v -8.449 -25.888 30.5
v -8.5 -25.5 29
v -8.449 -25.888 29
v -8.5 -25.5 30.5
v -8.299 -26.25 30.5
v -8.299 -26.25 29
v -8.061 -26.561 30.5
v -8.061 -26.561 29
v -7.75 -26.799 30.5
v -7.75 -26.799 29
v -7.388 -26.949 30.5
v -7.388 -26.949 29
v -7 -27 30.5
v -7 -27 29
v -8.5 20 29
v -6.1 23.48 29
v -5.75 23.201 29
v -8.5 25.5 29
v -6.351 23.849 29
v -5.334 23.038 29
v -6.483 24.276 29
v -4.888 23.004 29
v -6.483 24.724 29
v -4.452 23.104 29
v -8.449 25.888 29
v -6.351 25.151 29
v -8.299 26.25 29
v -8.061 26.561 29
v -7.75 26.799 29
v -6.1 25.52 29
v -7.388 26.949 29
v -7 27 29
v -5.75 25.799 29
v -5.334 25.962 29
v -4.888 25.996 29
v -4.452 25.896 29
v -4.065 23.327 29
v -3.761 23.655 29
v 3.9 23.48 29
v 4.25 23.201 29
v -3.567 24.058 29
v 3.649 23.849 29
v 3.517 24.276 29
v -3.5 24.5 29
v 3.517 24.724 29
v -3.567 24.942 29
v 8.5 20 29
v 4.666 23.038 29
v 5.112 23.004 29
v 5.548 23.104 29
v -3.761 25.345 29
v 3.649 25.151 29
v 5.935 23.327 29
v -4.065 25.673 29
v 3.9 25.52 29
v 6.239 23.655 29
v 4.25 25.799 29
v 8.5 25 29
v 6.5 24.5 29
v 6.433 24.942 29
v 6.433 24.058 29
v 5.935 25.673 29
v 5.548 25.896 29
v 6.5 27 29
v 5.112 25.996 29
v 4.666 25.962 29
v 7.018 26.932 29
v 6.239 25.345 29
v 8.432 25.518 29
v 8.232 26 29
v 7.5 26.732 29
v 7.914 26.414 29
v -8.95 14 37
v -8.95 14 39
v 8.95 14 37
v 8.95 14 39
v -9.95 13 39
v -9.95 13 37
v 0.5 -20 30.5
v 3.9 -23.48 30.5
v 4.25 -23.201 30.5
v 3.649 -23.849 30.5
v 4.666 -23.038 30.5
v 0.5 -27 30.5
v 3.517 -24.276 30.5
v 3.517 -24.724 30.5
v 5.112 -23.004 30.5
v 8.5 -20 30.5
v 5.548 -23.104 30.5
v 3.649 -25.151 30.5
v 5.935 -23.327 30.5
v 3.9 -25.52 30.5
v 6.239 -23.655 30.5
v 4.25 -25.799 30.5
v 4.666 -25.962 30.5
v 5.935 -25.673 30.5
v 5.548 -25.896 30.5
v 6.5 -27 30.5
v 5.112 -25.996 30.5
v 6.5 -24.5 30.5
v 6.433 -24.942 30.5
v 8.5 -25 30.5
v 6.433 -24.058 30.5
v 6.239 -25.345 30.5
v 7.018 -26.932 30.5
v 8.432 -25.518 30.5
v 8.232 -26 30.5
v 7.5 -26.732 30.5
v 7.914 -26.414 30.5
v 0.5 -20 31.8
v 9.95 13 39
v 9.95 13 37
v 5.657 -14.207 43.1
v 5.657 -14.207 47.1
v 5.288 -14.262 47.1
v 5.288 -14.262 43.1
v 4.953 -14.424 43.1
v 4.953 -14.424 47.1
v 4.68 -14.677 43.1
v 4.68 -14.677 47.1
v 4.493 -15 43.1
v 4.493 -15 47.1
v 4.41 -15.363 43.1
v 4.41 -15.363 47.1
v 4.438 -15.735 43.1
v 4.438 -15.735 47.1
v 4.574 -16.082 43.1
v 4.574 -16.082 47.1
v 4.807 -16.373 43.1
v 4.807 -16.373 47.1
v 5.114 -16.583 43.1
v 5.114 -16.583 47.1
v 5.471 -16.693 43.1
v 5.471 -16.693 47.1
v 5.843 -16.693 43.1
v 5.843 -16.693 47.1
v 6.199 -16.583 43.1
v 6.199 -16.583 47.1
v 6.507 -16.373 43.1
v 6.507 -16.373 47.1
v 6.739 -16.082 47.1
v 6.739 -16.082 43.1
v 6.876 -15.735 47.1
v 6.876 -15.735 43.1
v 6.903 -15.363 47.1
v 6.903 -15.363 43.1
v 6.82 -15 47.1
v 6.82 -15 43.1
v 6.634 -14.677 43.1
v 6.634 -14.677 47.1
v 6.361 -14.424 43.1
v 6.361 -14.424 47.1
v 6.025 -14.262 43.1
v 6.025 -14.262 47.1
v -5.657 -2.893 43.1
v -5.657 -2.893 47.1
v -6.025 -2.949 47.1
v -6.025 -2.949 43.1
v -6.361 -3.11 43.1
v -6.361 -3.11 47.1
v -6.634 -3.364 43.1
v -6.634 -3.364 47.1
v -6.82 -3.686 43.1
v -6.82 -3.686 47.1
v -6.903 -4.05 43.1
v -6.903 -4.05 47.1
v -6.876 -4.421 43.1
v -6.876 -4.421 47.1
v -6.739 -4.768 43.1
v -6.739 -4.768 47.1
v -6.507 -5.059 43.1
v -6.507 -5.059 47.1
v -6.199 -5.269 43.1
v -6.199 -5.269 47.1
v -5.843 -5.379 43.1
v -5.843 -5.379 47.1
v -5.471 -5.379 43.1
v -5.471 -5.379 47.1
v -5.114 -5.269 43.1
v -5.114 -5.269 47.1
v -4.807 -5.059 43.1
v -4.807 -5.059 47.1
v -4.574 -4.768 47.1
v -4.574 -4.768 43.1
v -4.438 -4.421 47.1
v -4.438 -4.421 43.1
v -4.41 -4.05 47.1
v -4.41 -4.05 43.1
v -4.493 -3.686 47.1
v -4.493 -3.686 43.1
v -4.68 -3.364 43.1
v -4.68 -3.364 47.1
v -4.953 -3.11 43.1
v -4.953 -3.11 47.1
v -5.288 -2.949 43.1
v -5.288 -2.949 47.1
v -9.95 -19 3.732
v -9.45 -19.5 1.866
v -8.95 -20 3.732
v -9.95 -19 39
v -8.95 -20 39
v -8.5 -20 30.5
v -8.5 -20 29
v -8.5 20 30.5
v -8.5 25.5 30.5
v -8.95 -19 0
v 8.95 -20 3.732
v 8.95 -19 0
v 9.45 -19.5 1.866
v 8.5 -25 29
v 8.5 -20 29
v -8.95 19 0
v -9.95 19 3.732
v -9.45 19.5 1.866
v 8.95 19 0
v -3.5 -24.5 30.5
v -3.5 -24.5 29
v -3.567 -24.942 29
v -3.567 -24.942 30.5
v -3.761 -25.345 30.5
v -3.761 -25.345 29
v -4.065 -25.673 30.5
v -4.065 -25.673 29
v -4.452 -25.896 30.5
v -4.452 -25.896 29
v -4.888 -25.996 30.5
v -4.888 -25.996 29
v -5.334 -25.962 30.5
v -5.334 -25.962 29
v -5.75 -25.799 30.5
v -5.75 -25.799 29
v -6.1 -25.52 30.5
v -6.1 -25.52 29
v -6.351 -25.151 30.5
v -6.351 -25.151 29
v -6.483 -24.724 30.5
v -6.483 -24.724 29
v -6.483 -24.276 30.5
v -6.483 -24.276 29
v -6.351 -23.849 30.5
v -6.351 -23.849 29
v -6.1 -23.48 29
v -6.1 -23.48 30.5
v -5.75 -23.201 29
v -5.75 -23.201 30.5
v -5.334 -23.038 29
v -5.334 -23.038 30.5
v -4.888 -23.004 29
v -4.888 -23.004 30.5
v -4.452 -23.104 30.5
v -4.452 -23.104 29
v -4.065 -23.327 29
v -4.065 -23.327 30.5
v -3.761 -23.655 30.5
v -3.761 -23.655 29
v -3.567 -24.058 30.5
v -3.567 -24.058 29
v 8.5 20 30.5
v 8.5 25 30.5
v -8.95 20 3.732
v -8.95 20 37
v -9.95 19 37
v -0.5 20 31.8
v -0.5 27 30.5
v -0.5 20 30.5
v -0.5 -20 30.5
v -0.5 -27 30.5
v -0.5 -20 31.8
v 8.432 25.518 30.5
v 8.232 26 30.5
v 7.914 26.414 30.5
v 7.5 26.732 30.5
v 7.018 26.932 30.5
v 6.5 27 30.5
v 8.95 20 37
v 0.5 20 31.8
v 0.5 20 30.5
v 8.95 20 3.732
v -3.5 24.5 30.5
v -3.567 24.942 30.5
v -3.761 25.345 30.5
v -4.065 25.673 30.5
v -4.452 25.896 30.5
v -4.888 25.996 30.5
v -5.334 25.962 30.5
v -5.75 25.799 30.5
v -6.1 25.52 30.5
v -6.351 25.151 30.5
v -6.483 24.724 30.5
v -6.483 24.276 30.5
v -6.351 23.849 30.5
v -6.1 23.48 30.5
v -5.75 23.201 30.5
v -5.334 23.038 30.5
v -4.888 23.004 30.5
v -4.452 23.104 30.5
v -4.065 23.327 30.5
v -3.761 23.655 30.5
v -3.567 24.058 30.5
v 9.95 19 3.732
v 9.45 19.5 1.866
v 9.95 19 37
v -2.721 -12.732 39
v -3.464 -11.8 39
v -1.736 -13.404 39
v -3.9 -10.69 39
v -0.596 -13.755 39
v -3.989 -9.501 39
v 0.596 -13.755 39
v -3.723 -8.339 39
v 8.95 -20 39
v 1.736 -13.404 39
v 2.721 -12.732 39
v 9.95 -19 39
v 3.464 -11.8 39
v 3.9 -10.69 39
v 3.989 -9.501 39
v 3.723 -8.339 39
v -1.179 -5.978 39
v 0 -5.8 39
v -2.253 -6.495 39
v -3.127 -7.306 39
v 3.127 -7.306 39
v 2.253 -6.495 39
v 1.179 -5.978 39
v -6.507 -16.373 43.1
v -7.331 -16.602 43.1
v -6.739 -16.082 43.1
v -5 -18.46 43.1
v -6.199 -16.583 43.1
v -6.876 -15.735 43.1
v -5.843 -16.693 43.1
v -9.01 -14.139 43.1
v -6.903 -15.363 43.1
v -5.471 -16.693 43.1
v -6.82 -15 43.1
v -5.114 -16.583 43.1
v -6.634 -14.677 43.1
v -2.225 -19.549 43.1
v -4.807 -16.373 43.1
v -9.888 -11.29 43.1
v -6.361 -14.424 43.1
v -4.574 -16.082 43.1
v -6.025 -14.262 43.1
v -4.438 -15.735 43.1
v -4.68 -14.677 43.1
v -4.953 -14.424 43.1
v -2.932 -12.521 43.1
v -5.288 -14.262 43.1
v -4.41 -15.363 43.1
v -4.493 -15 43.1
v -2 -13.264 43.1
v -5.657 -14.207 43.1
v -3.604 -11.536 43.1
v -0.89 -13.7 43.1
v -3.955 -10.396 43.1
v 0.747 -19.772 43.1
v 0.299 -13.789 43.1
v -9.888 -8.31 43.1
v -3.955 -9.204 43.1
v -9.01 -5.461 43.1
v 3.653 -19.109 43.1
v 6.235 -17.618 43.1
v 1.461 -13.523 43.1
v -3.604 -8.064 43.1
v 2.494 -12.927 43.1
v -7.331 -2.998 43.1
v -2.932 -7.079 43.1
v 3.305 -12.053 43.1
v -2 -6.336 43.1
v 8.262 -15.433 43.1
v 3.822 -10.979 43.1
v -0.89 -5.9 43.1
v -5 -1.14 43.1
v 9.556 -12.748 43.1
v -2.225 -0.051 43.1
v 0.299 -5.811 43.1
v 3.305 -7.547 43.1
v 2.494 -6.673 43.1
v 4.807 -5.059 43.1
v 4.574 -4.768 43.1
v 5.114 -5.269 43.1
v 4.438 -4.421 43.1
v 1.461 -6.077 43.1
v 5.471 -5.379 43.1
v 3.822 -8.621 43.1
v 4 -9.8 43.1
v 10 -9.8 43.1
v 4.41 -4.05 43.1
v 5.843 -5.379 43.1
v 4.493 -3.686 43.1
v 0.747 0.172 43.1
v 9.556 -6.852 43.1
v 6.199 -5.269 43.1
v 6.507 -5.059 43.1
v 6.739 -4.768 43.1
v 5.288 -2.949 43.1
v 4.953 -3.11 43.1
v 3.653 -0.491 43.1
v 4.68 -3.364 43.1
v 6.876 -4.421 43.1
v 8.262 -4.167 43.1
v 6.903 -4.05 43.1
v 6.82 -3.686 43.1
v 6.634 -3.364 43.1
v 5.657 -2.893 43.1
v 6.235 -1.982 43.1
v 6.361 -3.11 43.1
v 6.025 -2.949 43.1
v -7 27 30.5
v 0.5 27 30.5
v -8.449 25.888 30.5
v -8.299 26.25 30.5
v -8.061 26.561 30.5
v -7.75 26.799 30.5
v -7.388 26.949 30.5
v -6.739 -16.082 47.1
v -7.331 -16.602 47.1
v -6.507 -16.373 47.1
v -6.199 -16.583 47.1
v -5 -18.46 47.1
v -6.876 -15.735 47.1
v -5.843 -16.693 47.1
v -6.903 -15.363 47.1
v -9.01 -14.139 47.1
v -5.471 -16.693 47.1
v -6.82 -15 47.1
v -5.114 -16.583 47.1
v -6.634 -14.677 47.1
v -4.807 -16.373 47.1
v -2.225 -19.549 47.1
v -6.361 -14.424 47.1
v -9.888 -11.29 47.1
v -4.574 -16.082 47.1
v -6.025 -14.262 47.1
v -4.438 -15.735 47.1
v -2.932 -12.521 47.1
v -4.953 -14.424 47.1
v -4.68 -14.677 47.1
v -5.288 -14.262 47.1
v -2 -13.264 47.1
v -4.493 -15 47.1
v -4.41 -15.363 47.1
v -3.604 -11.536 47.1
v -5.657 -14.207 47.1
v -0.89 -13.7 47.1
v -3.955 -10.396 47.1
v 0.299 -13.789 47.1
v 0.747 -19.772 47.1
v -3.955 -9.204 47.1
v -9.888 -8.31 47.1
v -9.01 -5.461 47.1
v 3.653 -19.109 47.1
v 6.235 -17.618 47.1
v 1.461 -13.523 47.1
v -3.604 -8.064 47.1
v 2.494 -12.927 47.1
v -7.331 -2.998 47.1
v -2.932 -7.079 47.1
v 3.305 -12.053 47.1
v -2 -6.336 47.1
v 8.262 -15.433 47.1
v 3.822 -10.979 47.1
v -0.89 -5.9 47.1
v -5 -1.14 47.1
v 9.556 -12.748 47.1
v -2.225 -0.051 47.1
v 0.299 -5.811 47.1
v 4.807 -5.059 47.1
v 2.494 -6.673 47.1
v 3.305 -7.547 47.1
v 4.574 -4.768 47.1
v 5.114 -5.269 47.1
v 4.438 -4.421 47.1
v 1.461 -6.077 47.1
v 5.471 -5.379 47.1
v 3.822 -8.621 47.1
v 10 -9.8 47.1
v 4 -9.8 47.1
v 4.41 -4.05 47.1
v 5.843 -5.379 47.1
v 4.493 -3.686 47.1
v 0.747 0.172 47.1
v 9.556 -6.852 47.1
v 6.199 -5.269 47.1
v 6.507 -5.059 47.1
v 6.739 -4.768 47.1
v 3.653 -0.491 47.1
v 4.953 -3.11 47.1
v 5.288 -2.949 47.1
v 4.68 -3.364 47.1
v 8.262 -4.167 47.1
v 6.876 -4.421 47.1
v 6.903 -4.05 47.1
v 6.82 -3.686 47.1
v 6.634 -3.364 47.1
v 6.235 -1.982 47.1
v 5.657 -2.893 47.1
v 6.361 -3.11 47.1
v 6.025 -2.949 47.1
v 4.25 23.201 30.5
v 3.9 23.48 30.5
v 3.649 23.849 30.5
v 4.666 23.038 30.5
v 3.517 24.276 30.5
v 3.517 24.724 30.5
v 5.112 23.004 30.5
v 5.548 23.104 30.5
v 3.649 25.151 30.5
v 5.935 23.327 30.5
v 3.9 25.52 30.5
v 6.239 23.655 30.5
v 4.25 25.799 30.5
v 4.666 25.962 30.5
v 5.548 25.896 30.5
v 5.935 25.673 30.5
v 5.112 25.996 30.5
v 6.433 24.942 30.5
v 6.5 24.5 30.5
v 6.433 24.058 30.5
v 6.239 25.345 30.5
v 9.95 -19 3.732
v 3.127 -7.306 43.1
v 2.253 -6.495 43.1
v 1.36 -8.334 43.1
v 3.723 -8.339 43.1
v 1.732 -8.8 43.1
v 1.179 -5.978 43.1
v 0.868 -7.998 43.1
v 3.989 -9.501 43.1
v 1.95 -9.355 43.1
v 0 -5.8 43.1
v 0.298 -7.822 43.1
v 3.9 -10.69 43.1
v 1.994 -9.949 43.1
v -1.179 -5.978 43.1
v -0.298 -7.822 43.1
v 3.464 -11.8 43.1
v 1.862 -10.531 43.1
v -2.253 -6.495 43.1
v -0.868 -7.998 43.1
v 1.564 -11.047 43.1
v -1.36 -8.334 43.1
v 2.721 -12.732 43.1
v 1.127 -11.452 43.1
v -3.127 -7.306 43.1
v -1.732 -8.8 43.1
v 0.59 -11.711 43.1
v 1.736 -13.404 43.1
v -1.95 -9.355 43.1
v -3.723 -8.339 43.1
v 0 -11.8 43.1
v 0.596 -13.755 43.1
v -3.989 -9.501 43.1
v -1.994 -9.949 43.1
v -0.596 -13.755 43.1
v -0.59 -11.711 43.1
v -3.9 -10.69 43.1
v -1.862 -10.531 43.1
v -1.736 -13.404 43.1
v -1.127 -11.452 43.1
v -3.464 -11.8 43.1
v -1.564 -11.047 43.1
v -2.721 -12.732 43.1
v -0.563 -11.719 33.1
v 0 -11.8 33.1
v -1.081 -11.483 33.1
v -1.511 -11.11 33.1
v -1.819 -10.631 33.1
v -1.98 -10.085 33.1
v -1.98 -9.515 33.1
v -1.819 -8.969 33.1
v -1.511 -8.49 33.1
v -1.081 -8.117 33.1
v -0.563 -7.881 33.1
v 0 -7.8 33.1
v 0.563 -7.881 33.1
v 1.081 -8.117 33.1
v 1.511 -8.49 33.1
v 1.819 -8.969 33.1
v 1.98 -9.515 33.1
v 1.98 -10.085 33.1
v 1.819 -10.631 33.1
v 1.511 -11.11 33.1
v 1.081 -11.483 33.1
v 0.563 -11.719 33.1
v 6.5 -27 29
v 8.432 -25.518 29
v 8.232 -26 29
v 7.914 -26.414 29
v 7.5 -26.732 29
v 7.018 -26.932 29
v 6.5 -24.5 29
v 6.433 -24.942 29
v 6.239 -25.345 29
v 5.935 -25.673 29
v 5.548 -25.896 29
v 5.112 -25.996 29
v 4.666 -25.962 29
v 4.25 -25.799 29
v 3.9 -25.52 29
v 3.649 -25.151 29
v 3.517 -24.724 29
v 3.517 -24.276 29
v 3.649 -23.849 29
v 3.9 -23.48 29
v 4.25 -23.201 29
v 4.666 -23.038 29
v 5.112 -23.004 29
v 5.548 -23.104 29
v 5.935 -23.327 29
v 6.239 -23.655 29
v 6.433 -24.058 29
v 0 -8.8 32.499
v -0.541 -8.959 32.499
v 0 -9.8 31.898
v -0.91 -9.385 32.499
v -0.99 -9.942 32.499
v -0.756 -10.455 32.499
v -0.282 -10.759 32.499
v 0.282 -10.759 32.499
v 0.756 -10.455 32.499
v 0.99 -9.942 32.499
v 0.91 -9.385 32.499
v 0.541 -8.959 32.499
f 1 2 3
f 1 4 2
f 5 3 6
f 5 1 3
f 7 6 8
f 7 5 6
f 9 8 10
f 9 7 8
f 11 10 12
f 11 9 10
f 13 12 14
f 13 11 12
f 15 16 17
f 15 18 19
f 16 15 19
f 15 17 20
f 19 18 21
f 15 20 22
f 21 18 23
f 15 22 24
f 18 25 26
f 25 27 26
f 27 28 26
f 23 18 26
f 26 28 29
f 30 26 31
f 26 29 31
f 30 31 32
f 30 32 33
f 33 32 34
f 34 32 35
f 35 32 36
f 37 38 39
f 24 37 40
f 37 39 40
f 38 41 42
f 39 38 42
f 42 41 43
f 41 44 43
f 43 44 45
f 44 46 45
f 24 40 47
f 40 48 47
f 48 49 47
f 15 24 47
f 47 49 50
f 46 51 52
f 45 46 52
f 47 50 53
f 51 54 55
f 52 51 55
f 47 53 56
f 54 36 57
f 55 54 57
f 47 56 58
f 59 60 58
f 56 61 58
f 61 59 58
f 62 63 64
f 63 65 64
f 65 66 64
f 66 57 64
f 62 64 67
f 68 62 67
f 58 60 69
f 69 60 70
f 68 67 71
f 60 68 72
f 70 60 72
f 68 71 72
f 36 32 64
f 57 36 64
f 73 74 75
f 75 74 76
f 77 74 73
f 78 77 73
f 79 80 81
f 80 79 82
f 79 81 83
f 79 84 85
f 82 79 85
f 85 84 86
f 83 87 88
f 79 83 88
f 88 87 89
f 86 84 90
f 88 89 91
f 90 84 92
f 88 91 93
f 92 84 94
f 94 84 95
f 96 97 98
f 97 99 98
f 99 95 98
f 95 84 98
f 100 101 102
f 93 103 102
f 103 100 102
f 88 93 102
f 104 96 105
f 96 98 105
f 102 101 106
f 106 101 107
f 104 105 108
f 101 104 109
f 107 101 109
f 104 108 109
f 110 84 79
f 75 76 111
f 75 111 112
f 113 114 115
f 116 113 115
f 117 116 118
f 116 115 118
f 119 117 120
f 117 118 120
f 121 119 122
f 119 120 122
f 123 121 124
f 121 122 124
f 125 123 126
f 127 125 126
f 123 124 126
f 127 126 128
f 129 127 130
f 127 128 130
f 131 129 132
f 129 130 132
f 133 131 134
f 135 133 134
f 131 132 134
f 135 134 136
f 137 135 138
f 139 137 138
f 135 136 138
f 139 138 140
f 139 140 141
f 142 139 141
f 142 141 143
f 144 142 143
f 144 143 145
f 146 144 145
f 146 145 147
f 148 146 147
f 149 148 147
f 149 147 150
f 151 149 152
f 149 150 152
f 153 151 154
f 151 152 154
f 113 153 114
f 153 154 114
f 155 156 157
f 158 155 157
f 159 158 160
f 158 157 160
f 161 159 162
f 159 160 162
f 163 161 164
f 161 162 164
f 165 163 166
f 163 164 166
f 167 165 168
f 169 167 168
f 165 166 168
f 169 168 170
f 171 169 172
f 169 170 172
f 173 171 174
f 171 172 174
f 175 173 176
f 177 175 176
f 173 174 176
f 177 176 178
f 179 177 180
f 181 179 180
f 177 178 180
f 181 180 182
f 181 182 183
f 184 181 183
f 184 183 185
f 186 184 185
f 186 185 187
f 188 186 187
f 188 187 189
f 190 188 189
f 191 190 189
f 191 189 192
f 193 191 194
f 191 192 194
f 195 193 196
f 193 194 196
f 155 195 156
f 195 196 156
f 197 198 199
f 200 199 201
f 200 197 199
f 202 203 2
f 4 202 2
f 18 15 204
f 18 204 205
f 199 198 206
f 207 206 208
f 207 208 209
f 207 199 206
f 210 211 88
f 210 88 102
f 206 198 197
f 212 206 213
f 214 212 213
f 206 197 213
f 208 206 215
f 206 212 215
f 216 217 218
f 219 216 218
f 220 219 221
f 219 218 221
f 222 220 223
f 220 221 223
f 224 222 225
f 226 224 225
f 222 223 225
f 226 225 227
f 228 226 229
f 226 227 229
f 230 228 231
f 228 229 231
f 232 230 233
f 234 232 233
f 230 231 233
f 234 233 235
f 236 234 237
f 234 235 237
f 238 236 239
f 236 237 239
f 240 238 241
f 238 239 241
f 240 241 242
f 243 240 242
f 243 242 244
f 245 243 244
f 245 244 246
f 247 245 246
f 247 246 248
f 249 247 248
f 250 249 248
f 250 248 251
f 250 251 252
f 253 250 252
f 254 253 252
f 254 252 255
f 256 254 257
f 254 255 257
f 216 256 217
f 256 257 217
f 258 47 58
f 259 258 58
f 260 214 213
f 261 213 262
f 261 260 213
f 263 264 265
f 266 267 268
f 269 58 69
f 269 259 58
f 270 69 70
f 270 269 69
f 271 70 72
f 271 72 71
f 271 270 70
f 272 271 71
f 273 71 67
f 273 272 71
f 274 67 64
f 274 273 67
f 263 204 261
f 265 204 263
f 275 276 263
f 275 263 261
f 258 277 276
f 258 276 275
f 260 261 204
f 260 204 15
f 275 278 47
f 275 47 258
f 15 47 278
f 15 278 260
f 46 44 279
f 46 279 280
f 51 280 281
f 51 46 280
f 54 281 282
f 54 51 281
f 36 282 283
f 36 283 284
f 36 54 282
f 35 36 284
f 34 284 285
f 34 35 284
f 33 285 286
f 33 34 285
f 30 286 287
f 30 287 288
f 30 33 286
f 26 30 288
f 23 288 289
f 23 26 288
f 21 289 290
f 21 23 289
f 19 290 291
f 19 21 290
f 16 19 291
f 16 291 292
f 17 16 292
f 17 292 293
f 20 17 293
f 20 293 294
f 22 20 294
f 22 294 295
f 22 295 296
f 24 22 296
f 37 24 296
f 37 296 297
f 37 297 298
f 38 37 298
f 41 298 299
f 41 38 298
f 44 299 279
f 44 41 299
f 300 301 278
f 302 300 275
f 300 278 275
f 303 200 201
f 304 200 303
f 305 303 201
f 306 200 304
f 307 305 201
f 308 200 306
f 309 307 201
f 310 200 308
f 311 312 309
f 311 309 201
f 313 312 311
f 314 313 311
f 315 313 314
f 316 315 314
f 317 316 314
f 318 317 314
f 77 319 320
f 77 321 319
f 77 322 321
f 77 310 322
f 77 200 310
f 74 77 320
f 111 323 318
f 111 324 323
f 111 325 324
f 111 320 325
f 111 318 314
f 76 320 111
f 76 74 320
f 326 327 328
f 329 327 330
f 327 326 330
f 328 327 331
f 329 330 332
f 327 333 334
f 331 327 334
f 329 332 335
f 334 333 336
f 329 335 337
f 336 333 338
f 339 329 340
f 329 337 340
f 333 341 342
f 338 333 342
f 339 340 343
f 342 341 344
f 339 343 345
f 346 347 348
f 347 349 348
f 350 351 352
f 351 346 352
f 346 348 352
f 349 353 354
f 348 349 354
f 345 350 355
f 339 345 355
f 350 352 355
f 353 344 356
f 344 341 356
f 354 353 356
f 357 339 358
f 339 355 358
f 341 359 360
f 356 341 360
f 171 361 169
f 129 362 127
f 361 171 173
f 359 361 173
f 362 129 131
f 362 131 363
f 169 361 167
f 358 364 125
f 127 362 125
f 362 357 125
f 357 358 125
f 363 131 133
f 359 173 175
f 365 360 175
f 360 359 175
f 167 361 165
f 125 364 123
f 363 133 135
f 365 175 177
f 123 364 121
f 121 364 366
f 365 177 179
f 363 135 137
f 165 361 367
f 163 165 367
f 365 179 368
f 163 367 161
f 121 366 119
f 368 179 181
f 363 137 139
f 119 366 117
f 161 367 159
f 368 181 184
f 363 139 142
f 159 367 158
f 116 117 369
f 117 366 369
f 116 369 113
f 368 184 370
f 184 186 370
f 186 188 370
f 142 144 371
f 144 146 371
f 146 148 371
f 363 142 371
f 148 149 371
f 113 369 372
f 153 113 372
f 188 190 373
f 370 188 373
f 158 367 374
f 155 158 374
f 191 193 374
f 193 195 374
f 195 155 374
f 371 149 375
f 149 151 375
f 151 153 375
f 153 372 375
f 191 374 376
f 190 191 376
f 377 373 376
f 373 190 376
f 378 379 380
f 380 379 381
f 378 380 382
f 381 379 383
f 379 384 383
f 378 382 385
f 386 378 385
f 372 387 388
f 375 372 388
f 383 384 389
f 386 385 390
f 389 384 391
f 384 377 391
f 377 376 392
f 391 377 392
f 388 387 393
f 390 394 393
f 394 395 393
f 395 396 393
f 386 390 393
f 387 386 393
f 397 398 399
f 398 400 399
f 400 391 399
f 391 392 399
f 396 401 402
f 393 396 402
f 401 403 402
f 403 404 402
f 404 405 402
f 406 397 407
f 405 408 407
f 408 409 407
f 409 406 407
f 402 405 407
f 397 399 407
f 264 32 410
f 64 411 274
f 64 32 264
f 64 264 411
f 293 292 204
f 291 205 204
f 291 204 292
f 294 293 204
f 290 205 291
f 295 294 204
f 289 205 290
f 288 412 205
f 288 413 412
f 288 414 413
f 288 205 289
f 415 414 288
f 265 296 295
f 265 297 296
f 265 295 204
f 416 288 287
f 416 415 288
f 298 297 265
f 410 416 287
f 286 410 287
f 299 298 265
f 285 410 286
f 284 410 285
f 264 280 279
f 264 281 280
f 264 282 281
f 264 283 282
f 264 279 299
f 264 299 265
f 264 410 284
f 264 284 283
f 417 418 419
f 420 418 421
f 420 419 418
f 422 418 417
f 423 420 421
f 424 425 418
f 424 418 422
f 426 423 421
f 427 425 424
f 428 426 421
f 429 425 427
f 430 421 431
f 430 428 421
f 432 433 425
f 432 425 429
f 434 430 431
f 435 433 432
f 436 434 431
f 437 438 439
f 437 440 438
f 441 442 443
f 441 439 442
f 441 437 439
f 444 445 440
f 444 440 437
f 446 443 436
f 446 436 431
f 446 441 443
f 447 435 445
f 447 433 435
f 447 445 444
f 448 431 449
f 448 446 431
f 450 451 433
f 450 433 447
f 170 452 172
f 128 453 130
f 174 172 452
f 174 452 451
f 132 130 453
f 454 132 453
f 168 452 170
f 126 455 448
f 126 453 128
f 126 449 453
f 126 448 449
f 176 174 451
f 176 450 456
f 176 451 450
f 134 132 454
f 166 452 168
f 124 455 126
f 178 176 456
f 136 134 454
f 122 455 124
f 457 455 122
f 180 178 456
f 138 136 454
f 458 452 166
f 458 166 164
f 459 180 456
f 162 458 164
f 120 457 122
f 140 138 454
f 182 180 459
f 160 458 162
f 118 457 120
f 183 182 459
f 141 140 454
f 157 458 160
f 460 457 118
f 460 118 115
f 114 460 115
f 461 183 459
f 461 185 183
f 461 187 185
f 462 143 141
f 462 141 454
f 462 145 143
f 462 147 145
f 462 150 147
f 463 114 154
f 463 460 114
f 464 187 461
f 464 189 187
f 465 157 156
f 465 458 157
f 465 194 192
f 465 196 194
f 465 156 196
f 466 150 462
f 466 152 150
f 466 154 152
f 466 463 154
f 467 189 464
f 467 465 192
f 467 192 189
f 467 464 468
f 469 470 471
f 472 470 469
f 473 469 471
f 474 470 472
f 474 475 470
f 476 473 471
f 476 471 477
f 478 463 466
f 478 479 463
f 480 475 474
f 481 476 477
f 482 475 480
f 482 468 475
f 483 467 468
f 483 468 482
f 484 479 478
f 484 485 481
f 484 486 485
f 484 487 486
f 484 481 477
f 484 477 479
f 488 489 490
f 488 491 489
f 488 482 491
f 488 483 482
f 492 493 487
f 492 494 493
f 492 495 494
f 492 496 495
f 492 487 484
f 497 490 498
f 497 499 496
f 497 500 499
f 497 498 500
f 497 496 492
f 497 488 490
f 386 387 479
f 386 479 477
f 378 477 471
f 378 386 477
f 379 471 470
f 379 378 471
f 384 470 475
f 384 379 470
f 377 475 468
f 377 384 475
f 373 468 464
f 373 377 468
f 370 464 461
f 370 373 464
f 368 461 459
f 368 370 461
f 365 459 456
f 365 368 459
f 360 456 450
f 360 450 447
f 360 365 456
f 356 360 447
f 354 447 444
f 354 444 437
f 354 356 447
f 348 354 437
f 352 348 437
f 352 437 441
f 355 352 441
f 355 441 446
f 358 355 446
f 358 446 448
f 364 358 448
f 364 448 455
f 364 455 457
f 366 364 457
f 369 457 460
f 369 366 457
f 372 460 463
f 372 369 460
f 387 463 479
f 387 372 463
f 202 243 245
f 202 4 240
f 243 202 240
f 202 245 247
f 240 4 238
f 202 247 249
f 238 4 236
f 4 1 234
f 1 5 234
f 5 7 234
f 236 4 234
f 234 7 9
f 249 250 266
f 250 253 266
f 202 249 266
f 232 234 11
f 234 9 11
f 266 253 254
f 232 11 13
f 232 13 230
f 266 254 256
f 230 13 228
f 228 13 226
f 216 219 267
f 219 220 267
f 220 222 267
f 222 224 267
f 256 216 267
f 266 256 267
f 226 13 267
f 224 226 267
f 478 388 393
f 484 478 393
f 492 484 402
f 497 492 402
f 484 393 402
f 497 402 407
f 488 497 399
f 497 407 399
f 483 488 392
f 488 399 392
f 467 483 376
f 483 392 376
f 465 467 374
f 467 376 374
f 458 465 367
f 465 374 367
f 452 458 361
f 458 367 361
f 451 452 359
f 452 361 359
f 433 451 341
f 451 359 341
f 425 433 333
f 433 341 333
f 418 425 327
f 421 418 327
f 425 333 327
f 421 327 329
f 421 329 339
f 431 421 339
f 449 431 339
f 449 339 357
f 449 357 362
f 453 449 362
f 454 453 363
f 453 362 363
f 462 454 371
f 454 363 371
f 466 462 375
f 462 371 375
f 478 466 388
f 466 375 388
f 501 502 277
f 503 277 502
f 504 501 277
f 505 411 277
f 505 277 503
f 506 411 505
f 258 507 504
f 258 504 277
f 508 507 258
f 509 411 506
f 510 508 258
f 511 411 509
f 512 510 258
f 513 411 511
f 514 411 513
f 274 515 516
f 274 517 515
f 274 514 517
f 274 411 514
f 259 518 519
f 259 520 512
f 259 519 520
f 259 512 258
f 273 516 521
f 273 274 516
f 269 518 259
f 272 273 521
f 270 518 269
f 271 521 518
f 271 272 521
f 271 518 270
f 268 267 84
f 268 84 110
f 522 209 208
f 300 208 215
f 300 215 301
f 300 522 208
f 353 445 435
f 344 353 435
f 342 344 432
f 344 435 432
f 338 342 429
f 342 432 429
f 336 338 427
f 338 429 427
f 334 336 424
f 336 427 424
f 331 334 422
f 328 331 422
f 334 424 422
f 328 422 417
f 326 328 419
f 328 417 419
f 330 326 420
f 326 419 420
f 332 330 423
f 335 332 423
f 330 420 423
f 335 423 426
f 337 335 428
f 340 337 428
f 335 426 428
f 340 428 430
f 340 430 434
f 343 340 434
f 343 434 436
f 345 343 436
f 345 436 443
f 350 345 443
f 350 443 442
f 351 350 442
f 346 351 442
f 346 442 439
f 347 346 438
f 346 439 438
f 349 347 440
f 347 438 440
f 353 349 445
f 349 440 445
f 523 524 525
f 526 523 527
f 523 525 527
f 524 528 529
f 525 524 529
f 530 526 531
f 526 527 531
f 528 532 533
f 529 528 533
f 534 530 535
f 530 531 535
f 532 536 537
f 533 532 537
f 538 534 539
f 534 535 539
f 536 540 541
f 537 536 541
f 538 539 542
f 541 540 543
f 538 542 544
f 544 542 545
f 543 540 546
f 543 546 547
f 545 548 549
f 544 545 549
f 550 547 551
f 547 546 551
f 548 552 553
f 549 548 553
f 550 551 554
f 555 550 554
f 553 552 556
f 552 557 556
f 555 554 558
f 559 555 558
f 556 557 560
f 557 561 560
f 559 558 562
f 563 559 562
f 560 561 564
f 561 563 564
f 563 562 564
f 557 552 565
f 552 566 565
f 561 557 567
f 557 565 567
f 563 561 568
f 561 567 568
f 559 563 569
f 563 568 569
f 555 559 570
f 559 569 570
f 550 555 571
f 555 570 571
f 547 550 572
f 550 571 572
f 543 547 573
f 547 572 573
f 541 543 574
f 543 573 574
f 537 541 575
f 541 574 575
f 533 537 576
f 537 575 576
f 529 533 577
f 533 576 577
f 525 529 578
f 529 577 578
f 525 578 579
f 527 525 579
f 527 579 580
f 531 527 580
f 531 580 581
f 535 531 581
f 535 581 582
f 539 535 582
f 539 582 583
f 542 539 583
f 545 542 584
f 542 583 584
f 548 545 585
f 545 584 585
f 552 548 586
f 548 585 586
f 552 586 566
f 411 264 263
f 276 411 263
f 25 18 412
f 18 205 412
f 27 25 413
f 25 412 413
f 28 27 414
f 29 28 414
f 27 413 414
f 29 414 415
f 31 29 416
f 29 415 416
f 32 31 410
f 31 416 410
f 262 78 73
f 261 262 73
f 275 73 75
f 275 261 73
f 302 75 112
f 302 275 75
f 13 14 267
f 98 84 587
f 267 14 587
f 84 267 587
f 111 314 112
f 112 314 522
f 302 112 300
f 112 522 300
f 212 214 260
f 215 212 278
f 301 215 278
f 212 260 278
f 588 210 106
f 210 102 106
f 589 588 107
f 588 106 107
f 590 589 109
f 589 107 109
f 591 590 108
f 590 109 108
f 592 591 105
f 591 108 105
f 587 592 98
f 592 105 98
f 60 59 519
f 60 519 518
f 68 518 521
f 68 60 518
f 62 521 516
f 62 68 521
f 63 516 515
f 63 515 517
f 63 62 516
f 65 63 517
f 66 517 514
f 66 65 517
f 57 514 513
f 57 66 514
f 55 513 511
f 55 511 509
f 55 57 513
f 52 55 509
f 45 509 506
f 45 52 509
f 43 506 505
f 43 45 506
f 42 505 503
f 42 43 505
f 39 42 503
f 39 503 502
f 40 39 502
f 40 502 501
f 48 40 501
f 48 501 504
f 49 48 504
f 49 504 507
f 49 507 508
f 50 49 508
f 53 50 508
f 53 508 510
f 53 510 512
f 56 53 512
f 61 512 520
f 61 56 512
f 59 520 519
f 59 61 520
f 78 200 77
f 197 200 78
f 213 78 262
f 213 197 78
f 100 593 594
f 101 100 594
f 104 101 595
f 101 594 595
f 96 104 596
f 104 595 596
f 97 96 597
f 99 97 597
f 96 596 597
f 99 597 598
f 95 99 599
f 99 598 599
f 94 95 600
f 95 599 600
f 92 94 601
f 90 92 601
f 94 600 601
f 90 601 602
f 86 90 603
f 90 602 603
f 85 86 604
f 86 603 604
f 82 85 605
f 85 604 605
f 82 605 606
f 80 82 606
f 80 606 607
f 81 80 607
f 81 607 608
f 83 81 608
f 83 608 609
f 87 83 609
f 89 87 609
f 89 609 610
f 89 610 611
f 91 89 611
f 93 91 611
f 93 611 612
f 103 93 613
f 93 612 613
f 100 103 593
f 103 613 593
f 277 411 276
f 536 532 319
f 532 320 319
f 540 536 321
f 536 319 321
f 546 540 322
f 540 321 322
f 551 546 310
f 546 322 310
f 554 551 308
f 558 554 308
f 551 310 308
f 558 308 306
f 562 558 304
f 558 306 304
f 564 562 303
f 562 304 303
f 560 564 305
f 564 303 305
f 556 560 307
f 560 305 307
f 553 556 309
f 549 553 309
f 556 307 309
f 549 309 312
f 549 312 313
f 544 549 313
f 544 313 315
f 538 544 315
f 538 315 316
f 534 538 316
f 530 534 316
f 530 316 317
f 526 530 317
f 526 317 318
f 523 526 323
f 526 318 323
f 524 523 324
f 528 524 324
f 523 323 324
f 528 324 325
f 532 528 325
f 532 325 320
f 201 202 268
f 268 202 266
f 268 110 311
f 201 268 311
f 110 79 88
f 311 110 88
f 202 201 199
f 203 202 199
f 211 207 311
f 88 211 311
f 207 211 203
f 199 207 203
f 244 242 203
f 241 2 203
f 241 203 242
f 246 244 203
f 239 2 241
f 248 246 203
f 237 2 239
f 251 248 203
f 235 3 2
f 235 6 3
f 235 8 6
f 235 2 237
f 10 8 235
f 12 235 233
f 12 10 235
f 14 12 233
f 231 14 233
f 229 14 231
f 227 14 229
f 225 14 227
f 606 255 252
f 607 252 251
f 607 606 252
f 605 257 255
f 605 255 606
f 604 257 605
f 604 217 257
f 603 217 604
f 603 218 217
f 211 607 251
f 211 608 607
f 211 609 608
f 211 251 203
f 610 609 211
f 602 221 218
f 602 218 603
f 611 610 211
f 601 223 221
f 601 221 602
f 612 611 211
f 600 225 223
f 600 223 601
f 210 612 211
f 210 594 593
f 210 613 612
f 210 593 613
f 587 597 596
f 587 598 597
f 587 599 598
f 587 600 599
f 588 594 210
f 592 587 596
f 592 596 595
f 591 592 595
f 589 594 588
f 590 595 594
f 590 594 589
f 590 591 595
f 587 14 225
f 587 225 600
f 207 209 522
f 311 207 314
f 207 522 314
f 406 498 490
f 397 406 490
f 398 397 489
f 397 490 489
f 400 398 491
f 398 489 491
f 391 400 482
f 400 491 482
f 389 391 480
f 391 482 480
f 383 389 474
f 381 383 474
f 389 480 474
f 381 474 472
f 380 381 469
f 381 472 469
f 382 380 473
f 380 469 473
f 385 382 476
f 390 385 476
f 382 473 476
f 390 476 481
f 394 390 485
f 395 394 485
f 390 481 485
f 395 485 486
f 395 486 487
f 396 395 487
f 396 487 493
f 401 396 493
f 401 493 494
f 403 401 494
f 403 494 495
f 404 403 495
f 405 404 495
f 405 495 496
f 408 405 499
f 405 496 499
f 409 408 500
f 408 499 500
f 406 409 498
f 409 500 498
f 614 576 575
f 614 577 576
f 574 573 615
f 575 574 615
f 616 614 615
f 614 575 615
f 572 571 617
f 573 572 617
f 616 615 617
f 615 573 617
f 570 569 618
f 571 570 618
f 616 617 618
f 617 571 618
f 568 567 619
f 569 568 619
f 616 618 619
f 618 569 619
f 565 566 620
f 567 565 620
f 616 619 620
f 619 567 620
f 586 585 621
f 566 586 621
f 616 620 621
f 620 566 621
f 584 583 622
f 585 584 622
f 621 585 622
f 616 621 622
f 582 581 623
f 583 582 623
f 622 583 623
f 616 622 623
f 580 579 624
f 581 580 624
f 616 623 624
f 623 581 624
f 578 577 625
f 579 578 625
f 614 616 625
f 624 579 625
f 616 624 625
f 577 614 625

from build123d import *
from OCP.BRepFilletAPI import BRepFilletAPI_MakeFillet

# Parameters (mm, degrees)
SKETCH_1_W                  = 19.9
SKETCH_1_H                  = 40
EXTRUDE_1_DEPTH             = 39
CHAMFER_1_SIZE              = 1
CHAMFER_1_SIZE2             = 3.732050808
SKETCH_2_W                  = 19.9
SKETCH_2_H                  = 6
CUT_EXTRUDE_1_DEPTH         = 2
SKETCH_4_W                  = 17
SKETCH_4_H                  = 7
SKETCH_4_R                  = 1.5
EXTRUDE_2_DEPTH             = 1.5
RIB_1_REACH                 = 50.467
SKETCH_5_WALL_W             = 106.052709114
SKETCH_5_WALL_H             = 1
FILLET_1_R1                 = 2
FILLET_1_R2                 = 1.5
FILLET_1_OF_MIRROR_1_R1     = 2
FILLET_1_OF_MIRROR_1_R2     = 1.5
SKETCH_7_W                  = 4.1
SKETCH_7_H                  = 4
MM_1_D                      = 4
MM_1_DEPTH                  = 10
MM_1_TIP                    = 1.201721238
CHAMFER_2_SIZE              = 1
EXTRUDE_START               = 4
SKETCH_13_R                 = 10
SKETCH_13_R_2               = 4
EXTRUDE_3_DEPTH             = 4
SKETCH_15_W                 = 1.25
SKETCH_15_H                 = 4.001
HOLE_WIZARD_M3_1_AT_2_COUNT = 2
HOLE_WIZARD_M3_1_AT_2_PITCH = 11.313708499
HOLE_WIZARD_M3_1_AT_3_COUNT = 2
HOLE_WIZARD_M3_1_AT_3_PITCH = 16
HOLE_WIZARD_M3_1_AT_4_COUNT = 2
HOLE_WIZARD_M3_1_AT_4_PITCH = 11.313708499


with BuildPart() as part:
    # 草图1 → 凸台-拉伸1 (new body)
    with BuildSketch(Plane.XY):
        Rectangle(SKETCH_1_W, SKETCH_1_H)
    extrude(amount=EXTRUDE_1_DEPTH)

    # 倒角1
    chamfer_1_edges = [part.edges().sort_by_distance(p)[0] for p in [
        (9.95, 0, 0),
        (0, -20, 0),
        (-9.95, 0, 0),
        (0, 20, 0),
    ]]
    chamfer_1_side = [part.faces().sort_by_distance(p)[0] for p in [
        (0, 0, 0),
    ]]
    chamfer(chamfer_1_edges, length=CHAMFER_1_SIZE, length2=CHAMFER_1_SIZE2, reference=chamfer_1_side[0])

    # 草图2 → 切除-拉伸1 (cut)
    with BuildSketch(Plane.XY.offset(39)):
        with Locations((0, 17)):
            Rectangle(SKETCH_2_W, SKETCH_2_H)
    extrude(amount=-CUT_EXTRUDE_1_DEPTH, mode=Mode.SUBTRACT)

    # 草图4 → 凸台-拉伸2 (add)
    with BuildSketch(Plane.XY.offset(29)):
        with Locations((0, 23.5)):
            Rectangle(SKETCH_4_W, SKETCH_4_H)
        with Locations((-5, 24.5)):
            Circle(SKETCH_4_R, mode=Mode.SUBTRACT)
        with Locations((5, 24.5)):
            Circle(SKETCH_4_R, mode=Mode.SUBTRACT)
    extrude_2 = extrude(amount=EXTRUDE_2_DEPTH)

    # 草图5 wall → 筋1 (add, up to next)
    with BuildSketch(Plane(origin=(0, 23.5, 31.15), x_dir=(0, -0.983188736076, 0.182592193843), z_dir=(0, -0.182592193843, -0.983188736076)), mode=Mode.PRIVATE) as rib_1_sk1:
        Rectangle(SKETCH_5_WALL_W, SKETCH_5_WALL_H)
    rib_1_tool1 = extrude(rib_1_sk1.sketch, amount=RIB_1_REACH, mode=Mode.PRIVATE) - part.part
    rib_1 = rib_1_tool1.solids().sort_by_distance((0, 23.5, 31.15))[0]
    add(rib_1)

    # 圆角1: one fillet with a radius per group of edges: ONE call of the kernel's fillet builder (fillet() takes one radius for all edges)
    fillet_1_edges_1 = [part.edges().sort_by_distance(p)[0] for p in [
        (8.5, 27, 29.75),
    ]]
    fillet_1_edges_2 = [part.edges().sort_by_distance(p)[0] for p in [
        (-8.5, 27, 29.75),
    ]]
    fillet_1 = BRepFilletAPI_MakeFillet(part.part.solid().wrapped)
    for e in fillet_1_edges_1:
        fillet_1.Add(FILLET_1_R1, e.wrapped)
    for e in fillet_1_edges_2:
        fillet_1.Add(FILLET_1_R2, e.wrapped)
    add(Compound.cast(fillet_1.Shape()), mode=Mode.REPLACE)

    # 镜向1: 凸台-拉伸2, 筋1 across plane
    add(extrude_2.mirror(Plane.ZX))
    add(rib_1.mirror(Plane.ZX))

    # 圆角1 of 镜向1: one fillet with a radius per group of edges: ONE call of the kernel's fillet builder (fillet() takes one radius for all edges)
    fillet_1_of_mirror_1_edges_1 = [part.edges().sort_by_distance(p)[0] for p in [
        (8.5, -27, 29.75),
    ]]
    fillet_1_of_mirror_1_edges_2 = [part.edges().sort_by_distance(p)[0] for p in [
        (-8.5, -27, 29.75),
    ]]
    fillet_1_of_mirror_1 = BRepFilletAPI_MakeFillet(part.part.solid().wrapped)
    for e in fillet_1_of_mirror_1_edges_1:
        fillet_1_of_mirror_1.Add(FILLET_1_OF_MIRROR_1_R1, e.wrapped)
    for e in fillet_1_of_mirror_1_edges_2:
        fillet_1_of_mirror_1.Add(FILLET_1_OF_MIRROR_1_R2, e.wrapped)
    add(Compound.cast(fillet_1_of_mirror_1.Shape()), mode=Mode.REPLACE)

    # 草图7 → 旋转2 (revolve)
    with BuildSketch(Plane(origin=(0, 0, 0), x_dir=(0, 0, -1), z_dir=(1, 0, 0))):
        with Locations((-41.05, -7.8)):
            Rectangle(SKETCH_7_W, SKETCH_7_H)
    revolve(axis=Axis((0, -9.8, 39), (0, 0, 1)))

    # 大小mm 暗销孔1
    with Locations(Plane(origin=(0, -9.8, 43.1), x_dir=(0, 1, 0), z_dir=(0, 0, 1))):
        with Locations((0, 0)):
            Hole(MM_1_D / 2, depth=MM_1_DEPTH)
            with Locations((0, 0, -(MM_1_DEPTH + MM_1_TIP / 2))):  # 118° drill point
                Cone(0, MM_1_D / 2, MM_1_TIP, mode=Mode.SUBTRACT)

    # 倒角2
    chamfer_2_edges = [part.edges().sort_by_distance(p)[0] for p in [
        (9.95, 14, 38),
        (-9.95, 14, 38),
        (9.95, -20, 21.366025404),
        (9.95, 20, 20.366025404),
        (-9.95, -20, 21.366025404),
        (-9.95, 20, 20.366025404),
    ]]
    chamfer(chamfer_2_edges, length=CHAMFER_2_SIZE)


with BuildPart() as body_2:
    # 草图13 → 凸台-拉伸3 (new body)
    with BuildSketch(Plane.XY.offset(43.1).offset(EXTRUDE_START)):
        with Locations((0, -9.8)):
            Circle(SKETCH_13_R)
        with Locations((0, -9.8)):
            Circle(SKETCH_13_R_2, mode=Mode.SUBTRACT)
    extrude(amount=-EXTRUDE_3_DEPTH)

    # 草图15 → M3 螺纹孔的螺纹孔钻头1 (revolve, cut)
    with BuildSketch(Plane(origin=(5.656854249, -4.143145751, 43.1), x_dir=(0, 1, 0), z_dir=(1, 0, 0))):
        with Locations((0.625, 2.0005)):
            Rectangle(SKETCH_15_W, SKETCH_15_H)
    hole_wizard_m3_1 = revolve(axis=Axis((5.656854249, -4.143145751, 36.75), (0, 0, 1)), mode=Mode.SUBTRACT)

    # M3 螺纹孔的螺纹孔钻头1 at 2: M3 螺纹孔的螺纹孔钻头1 ×2
    with Locations(*[(0, -i * HOLE_WIZARD_M3_1_AT_2_PITCH, 0) for i in range(1, HOLE_WIZARD_M3_1_AT_2_COUNT)]):
        add(hole_wizard_m3_1, mode=Mode.SUBTRACT)

    # M3 螺纹孔的螺纹孔钻头1 at 3: M3 螺纹孔的螺纹孔钻头1 ×2
    with Locations(*[Vector(-0.7071067811865476, -0.7071067811865476, 0) * (i * HOLE_WIZARD_M3_1_AT_3_PITCH) for i in range(1, HOLE_WIZARD_M3_1_AT_3_COUNT)]):
        add(hole_wizard_m3_1, mode=Mode.SUBTRACT)

    # M3 螺纹孔的螺纹孔钻头1 at 4: M3 螺纹孔的螺纹孔钻头1 ×2
    with Locations(*[(-i * HOLE_WIZARD_M3_1_AT_4_PITCH, 0, 0) for i in range(1, HOLE_WIZARD_M3_1_AT_4_COUNT)]):
        add(hole_wizard_m3_1, mode=Mode.SUBTRACT)


solid = Compound([part.part, body_2.part])
